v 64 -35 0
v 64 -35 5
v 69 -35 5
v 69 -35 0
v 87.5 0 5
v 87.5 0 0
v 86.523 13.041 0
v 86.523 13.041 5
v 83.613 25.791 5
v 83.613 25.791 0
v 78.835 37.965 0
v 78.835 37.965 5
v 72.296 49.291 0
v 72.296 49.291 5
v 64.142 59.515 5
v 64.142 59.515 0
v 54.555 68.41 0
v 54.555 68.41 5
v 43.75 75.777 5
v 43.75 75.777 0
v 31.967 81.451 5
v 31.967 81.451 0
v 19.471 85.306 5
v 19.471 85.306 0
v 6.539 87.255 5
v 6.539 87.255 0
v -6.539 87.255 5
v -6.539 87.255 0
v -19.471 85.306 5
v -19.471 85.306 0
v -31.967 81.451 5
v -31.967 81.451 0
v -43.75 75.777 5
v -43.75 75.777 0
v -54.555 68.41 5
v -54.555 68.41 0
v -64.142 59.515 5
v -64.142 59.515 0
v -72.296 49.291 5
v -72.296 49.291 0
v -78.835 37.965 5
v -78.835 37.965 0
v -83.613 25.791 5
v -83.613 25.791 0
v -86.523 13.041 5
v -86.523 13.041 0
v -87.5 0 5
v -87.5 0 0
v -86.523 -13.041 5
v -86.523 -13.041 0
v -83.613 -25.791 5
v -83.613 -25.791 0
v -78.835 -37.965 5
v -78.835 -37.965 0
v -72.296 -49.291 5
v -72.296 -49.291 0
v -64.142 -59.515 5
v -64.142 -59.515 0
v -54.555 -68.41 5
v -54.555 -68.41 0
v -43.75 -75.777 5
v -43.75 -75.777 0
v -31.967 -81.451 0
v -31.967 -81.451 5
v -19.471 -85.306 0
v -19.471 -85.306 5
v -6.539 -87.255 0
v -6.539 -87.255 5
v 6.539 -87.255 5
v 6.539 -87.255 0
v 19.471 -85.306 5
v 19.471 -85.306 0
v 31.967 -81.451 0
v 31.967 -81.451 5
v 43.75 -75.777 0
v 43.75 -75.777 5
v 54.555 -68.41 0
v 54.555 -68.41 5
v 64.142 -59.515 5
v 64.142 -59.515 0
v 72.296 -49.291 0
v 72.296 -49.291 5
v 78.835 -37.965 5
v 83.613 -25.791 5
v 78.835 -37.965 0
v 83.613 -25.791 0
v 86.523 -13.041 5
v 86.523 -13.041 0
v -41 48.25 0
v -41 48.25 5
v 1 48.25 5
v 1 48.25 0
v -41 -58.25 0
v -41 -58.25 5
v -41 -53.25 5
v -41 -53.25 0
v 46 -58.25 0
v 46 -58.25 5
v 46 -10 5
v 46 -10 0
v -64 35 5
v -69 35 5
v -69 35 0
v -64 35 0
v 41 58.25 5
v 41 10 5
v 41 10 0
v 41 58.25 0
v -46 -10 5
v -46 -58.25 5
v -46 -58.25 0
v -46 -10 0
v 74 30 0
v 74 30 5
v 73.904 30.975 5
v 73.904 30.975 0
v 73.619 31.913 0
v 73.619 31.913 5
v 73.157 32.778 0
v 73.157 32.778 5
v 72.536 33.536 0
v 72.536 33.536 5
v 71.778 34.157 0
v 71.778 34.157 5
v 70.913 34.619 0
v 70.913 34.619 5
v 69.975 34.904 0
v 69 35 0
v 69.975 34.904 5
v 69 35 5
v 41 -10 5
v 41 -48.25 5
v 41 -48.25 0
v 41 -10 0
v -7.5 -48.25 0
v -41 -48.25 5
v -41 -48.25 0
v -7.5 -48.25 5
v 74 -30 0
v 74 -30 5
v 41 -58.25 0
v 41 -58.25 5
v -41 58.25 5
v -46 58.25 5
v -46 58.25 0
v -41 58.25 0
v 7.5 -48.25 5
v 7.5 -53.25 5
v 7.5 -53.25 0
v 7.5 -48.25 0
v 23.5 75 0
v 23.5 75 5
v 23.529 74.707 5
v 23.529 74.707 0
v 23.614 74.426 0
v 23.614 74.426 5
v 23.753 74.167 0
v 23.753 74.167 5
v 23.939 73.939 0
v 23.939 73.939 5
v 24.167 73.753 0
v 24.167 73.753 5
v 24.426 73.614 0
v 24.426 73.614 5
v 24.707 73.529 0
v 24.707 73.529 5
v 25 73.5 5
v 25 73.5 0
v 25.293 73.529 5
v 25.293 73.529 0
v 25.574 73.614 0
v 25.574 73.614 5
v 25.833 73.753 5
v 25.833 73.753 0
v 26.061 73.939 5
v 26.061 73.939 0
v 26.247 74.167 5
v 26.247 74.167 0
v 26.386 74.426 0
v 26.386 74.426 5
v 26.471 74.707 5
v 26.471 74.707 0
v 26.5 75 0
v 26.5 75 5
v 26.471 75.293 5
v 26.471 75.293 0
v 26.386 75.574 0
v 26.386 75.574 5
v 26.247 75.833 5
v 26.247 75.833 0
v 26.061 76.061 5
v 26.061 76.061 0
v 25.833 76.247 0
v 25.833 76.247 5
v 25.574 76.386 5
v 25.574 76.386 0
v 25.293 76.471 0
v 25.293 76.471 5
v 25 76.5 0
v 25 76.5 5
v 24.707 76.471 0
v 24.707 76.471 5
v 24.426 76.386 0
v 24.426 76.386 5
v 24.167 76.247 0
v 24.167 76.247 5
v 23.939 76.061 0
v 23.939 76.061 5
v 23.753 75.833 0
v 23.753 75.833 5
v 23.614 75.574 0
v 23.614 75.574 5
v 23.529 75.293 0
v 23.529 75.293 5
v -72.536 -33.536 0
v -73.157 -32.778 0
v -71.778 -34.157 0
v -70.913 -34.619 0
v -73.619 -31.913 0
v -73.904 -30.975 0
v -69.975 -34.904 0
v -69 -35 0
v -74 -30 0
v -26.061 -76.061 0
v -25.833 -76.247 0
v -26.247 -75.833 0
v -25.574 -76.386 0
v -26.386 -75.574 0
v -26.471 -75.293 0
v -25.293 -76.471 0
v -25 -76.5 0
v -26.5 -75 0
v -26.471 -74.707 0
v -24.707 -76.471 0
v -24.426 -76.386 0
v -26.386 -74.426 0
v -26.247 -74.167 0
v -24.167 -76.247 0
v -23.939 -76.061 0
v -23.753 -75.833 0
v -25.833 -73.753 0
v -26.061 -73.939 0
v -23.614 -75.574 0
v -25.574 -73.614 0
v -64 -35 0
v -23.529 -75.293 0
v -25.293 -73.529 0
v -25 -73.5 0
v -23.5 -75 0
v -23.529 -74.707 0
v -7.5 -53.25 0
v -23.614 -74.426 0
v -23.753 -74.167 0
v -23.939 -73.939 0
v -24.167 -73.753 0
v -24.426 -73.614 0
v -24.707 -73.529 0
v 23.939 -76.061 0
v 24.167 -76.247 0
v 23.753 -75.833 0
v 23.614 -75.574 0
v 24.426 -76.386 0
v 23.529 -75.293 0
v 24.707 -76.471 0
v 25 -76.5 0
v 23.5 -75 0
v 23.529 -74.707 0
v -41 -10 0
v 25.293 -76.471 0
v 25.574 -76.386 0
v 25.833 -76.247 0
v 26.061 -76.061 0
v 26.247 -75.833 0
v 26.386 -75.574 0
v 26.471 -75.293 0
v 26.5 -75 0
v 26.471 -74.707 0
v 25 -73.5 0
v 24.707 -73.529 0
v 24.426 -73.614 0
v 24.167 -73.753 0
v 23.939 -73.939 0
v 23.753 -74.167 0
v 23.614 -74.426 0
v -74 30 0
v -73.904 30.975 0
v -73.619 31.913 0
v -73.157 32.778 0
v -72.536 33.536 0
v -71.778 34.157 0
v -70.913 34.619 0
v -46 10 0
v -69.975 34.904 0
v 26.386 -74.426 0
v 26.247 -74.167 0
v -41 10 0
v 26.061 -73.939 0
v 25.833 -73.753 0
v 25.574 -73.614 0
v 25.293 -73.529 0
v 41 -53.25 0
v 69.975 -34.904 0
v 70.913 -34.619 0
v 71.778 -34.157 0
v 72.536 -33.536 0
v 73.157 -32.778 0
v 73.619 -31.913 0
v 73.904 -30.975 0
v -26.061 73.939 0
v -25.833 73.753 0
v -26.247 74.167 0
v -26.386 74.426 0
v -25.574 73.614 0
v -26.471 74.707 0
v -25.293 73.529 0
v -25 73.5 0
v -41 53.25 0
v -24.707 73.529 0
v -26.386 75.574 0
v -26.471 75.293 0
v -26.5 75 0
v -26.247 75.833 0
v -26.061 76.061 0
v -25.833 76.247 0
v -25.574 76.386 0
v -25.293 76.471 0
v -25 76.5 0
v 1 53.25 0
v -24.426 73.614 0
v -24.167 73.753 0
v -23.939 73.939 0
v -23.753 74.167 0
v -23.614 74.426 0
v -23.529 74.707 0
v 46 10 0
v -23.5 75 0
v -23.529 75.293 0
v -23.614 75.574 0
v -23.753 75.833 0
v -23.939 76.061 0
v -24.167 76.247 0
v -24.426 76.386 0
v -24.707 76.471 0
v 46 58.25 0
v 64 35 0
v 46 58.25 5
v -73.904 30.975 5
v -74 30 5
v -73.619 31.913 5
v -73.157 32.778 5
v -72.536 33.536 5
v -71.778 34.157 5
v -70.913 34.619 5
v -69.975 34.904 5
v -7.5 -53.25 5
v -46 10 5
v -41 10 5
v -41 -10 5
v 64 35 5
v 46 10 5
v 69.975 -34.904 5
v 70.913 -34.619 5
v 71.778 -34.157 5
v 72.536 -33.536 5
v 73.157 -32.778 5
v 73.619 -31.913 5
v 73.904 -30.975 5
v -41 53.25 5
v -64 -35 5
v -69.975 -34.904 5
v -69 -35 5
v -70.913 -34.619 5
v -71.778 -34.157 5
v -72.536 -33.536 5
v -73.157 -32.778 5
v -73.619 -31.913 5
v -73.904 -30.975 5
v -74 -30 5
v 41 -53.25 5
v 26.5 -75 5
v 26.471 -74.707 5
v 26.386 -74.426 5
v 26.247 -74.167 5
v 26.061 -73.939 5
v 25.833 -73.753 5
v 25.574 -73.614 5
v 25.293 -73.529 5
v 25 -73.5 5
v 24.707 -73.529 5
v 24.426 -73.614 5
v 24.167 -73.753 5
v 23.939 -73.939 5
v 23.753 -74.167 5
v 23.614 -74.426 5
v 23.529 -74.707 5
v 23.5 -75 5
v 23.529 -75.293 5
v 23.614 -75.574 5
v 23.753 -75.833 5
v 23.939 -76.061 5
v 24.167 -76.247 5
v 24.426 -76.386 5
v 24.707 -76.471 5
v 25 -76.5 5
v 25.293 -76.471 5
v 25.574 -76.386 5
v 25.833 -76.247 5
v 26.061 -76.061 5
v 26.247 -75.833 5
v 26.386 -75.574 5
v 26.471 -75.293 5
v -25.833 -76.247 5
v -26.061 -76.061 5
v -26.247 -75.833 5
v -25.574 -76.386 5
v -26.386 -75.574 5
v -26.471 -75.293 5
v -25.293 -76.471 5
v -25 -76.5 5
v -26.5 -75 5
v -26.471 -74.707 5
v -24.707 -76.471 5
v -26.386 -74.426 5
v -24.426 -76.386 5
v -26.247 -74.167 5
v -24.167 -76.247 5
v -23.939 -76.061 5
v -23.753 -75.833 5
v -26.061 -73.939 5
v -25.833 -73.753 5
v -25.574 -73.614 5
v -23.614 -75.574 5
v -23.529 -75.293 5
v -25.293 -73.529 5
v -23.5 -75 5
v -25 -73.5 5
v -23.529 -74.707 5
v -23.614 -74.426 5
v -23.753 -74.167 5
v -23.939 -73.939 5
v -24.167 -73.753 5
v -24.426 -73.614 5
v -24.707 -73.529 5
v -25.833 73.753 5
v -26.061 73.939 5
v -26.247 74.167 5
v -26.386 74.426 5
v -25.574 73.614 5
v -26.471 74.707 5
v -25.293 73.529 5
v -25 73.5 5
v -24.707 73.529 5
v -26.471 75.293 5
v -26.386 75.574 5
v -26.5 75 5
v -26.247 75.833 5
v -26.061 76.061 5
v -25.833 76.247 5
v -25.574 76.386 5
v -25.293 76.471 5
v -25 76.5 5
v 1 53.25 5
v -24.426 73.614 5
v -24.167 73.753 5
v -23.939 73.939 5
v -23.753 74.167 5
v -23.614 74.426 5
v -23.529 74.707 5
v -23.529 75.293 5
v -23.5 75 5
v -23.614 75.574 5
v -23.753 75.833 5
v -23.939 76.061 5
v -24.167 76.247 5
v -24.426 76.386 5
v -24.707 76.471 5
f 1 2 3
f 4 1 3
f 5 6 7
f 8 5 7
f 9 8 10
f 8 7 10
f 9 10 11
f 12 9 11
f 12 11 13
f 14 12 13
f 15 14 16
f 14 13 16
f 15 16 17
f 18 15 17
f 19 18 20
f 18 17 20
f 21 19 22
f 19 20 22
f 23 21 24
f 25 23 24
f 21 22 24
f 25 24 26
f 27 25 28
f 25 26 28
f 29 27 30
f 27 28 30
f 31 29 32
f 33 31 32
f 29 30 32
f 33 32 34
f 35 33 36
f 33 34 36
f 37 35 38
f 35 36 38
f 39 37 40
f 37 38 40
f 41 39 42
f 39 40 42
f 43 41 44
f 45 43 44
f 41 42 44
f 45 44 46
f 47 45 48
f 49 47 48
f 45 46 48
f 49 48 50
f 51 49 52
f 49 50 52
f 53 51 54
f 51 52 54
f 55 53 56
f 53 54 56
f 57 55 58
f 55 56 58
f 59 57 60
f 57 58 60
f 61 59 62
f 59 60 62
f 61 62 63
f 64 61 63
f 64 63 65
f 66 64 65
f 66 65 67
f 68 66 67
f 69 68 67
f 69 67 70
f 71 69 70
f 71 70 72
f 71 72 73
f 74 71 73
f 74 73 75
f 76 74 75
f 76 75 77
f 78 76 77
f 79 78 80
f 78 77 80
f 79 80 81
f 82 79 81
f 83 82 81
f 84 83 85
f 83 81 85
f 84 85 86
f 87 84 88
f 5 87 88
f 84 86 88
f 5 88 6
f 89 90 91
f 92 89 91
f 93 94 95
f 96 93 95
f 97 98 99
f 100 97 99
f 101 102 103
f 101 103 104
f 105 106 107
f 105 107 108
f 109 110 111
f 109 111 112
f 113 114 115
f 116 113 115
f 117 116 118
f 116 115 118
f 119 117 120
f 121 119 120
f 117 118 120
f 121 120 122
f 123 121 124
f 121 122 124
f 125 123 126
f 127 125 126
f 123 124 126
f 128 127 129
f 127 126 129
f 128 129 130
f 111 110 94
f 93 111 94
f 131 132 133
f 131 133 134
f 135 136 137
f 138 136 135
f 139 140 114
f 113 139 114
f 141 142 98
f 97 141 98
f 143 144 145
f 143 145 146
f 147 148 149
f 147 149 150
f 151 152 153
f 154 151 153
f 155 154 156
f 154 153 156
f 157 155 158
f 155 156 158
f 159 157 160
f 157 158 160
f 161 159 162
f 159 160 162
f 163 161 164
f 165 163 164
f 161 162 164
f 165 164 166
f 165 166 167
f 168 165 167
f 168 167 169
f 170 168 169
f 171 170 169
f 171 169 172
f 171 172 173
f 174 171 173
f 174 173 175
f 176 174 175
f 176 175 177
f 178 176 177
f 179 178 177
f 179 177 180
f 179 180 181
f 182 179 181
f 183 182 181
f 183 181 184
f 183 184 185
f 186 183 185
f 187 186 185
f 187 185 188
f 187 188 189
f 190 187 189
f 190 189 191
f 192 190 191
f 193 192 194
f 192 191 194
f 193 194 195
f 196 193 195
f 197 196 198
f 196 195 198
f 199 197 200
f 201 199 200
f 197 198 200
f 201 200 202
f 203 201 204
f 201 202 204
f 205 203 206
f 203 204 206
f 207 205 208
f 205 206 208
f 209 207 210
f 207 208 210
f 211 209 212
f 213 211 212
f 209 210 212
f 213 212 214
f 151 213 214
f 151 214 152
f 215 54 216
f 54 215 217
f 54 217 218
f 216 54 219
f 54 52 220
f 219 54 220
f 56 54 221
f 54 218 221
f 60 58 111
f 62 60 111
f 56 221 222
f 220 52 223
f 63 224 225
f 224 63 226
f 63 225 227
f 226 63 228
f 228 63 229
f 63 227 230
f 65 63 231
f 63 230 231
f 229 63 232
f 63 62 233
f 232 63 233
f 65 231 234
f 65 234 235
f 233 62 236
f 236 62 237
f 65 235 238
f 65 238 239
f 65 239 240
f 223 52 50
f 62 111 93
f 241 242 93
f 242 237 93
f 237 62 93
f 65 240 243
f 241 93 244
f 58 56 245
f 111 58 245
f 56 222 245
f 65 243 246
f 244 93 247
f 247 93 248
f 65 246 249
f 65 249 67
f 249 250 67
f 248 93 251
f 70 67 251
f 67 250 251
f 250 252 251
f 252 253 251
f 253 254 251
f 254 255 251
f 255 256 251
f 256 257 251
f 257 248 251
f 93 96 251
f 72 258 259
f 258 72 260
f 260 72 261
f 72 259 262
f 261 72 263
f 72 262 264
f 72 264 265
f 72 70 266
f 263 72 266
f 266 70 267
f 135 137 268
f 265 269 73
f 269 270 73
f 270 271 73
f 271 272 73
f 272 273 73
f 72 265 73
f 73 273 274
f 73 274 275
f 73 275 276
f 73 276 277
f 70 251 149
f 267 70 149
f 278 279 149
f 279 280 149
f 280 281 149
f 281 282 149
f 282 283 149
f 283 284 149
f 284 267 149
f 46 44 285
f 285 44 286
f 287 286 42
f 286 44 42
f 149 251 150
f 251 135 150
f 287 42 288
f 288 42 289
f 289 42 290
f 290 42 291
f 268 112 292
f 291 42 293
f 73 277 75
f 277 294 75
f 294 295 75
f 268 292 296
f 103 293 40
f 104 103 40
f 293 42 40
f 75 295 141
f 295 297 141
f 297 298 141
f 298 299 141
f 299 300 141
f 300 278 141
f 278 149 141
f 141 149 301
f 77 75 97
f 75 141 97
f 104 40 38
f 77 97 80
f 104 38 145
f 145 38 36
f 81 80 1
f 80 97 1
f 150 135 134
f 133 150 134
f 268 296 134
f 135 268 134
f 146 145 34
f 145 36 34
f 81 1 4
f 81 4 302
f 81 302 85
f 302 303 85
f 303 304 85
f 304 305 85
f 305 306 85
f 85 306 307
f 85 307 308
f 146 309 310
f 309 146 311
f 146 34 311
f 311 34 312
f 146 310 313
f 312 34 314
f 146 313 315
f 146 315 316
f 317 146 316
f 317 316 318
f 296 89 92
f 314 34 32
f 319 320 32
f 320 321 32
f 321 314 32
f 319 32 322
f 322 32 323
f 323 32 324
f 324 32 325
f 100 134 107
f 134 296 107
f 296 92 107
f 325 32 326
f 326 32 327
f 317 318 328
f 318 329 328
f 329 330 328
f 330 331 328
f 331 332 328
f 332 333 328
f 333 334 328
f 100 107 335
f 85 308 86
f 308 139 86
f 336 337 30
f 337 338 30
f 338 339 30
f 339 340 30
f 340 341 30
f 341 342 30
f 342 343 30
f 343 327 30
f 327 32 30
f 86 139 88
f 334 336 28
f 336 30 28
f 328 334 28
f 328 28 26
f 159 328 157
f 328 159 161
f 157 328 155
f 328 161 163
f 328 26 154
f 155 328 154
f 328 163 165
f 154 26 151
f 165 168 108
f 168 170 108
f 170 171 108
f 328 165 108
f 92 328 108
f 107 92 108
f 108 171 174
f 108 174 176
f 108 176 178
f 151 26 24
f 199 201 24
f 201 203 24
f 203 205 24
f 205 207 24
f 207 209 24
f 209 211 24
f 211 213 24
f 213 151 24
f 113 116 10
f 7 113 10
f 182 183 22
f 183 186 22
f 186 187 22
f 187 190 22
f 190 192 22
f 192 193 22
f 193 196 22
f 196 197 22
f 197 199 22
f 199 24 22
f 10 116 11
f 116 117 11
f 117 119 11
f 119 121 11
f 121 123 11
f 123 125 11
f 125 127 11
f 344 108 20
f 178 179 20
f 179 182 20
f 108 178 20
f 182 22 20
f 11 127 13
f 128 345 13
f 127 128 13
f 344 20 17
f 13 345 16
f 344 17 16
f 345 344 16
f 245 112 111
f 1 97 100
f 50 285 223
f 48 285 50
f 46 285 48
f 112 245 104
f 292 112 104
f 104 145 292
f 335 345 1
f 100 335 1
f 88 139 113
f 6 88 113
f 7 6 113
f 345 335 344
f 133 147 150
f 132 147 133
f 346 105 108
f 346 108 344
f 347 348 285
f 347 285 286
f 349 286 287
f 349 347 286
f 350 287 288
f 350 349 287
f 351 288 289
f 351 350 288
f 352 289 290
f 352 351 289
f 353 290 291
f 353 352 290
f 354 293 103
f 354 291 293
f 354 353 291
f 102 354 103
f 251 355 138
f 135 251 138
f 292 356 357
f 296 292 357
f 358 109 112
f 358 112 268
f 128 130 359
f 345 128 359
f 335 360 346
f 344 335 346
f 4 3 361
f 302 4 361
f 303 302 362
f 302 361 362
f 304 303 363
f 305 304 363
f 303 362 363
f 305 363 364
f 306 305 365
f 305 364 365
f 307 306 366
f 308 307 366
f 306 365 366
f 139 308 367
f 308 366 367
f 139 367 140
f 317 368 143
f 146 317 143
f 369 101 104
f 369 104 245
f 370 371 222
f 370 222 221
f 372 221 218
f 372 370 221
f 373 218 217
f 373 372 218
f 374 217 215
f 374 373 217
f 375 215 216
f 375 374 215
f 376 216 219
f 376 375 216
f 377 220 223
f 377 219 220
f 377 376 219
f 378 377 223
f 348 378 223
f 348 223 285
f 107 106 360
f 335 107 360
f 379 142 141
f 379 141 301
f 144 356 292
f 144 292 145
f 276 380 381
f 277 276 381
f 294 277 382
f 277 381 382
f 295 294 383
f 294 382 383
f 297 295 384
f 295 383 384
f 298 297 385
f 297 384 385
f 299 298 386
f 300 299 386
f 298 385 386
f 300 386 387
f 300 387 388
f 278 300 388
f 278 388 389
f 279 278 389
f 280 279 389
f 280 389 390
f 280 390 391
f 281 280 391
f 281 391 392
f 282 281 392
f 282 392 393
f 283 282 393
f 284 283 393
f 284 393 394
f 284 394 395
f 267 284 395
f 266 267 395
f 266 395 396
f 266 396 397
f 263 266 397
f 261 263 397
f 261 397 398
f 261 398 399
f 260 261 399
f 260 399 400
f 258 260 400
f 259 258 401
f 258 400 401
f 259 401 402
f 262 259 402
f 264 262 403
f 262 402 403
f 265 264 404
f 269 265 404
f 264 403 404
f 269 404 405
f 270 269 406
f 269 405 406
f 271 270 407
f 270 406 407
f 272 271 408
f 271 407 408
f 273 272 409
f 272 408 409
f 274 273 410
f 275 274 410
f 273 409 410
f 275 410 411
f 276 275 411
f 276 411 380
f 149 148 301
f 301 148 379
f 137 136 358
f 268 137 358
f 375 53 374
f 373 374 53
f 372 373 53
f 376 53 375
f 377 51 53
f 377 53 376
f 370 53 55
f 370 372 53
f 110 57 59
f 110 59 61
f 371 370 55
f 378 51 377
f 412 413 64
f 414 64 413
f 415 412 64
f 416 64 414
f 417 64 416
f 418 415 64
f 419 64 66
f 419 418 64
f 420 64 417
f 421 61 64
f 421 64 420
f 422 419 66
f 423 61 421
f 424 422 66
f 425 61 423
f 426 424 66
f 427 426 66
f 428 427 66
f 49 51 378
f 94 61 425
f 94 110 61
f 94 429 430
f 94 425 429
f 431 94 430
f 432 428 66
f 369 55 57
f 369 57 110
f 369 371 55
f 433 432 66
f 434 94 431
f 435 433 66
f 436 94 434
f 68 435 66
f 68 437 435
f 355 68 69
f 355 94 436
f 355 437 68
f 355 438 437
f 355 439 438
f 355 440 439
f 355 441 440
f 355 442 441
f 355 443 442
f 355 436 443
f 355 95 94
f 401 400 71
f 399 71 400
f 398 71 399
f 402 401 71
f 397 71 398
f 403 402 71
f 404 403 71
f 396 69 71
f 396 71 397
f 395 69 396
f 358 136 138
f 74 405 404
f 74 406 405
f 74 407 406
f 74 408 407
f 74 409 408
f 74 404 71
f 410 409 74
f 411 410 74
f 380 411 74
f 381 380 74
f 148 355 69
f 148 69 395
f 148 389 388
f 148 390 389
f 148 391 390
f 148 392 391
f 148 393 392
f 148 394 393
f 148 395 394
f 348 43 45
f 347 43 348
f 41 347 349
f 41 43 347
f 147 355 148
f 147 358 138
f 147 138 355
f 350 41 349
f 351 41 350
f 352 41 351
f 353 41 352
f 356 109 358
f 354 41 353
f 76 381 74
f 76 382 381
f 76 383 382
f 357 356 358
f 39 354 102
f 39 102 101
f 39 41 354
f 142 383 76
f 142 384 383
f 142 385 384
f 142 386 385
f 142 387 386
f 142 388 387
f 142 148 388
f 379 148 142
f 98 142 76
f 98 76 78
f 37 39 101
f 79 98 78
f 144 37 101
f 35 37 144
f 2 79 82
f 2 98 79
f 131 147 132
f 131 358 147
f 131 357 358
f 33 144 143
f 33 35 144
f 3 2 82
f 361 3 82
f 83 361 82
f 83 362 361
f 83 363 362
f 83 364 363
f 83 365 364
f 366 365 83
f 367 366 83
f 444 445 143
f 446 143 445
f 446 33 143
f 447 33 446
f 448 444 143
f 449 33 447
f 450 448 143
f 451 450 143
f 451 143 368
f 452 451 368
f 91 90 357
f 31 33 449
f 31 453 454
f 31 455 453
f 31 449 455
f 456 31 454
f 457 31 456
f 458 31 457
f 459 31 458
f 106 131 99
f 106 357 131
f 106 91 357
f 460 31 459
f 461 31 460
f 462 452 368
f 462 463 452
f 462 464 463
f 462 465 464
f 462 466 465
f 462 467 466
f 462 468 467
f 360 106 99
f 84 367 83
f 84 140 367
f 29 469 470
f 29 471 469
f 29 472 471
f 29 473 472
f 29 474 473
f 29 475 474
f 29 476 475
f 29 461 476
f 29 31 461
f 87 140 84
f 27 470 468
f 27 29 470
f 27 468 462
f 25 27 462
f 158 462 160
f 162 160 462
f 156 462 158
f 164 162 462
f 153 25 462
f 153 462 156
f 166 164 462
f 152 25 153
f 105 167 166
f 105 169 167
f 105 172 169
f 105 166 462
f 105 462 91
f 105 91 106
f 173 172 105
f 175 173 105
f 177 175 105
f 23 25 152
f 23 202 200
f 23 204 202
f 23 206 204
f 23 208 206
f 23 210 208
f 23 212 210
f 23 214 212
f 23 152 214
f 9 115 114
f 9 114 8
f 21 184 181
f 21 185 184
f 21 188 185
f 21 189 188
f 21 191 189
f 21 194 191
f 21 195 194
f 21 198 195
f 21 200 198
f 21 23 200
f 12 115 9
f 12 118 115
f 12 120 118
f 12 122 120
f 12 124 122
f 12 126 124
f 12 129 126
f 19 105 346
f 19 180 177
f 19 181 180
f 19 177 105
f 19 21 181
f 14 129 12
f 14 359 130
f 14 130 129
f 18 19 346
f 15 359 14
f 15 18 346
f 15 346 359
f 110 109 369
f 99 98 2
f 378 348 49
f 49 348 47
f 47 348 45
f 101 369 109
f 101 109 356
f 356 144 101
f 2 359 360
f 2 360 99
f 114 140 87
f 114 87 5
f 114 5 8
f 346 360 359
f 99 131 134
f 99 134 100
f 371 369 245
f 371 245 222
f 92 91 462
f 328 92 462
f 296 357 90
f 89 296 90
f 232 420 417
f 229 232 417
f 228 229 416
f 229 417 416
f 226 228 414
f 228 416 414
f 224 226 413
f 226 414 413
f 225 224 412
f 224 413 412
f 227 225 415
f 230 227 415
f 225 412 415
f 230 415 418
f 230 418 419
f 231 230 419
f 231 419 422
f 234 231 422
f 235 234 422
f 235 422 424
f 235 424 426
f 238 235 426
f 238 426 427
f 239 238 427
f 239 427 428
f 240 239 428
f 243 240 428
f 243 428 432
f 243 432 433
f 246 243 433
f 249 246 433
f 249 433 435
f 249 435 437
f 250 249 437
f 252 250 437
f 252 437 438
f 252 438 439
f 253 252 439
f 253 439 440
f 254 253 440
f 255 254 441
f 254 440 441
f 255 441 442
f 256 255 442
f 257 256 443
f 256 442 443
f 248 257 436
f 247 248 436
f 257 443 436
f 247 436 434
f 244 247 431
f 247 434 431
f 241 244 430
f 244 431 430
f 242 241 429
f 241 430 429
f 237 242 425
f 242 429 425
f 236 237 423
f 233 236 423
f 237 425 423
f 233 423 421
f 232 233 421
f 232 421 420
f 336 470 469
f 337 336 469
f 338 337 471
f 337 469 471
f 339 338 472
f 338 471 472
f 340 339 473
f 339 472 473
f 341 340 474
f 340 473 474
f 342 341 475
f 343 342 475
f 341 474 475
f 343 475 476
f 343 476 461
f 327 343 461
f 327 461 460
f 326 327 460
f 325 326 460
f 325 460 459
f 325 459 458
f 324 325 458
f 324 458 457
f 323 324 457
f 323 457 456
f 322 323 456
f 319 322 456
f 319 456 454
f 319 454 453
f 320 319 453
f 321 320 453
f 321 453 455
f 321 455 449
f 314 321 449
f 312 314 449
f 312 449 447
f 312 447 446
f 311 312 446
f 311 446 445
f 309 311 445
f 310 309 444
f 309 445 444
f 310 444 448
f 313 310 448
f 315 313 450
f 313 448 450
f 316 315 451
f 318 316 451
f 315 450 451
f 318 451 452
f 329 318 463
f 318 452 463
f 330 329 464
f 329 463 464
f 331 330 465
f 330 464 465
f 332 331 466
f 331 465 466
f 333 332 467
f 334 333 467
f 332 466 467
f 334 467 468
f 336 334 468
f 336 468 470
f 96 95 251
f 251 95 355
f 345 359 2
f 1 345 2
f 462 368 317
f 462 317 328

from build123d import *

# Parameters (mm, degrees)
SKETCH_1_R          = 87.5
EXTRUDE_1_DEPTH     = 5
CUT_EXTRUDE_1_DEPTH = 124.844660765
SKETCH_2_R          = 1.5
CUT_EXTRUDE_2_DEPTH = 124.844660765
SKETCH_4_W          = 5
SKETCH_4_H          = 48.25
CUT_EXTRUDE_4_DEPTH = 124.844660765
SKETCH_5_W          = 42
SKETCH_5_H          = 5
SKETCH_5_W_2        = 33.5
CUT_EXTRUDE_7_DEPTH = 124.844660765


with BuildPart() as part:
    # 草圖1 → 填料-伸長1 (new body)
    with BuildSketch(Plane.XY):
        Circle(SKETCH_1_R)
    extrude(amount=EXTRUDE_1_DEPTH)

    # 草圖3 → 除料-伸長1 (cut, through all)
    with BuildSketch(Plane.XY.offset(5)):
        with BuildLine():
            ThreePointArc((-69, -35), (-72.535533906, -33.535533906), (-74, -30))
            Line((-74, -30), (-74, 30))
            ThreePointArc((-74, 30), (-72.535533906, 33.535533906), (-69, 35))
            Line((-69, 35), (-64, 35))
            Line((-64, 35), (-64, -35))
            Line((-64, -35), (-69, -35))
        make_face()
        with BuildLine():
            Line((64, 35), (64, -35))
            Line((64, -35), (69, -35))
            ThreePointArc((69, -35), (72.535533906, -33.535533906), (74, -30))
            Line((74, -30), (74, 30))
            ThreePointArc((74, 30), (72.535533906, 33.535533906), (69, 35))
            Line((69, 35), (64, 35))
        make_face()
    extrude(amount=-CUT_EXTRUDE_1_DEPTH, mode=Mode.SUBTRACT)

    # 草圖2 → 除料-伸長2 (cut, through all)
    with BuildSketch(Plane.XY.offset(5)):
        with Locations((-25, 75)):
            Circle(SKETCH_2_R)
        with Locations(Location((-25, -75, 0), (0, 0, 180))):
            Circle(SKETCH_2_R)
        with Locations(Location((25, 75, 0), (0, 0, 180))):
            Circle(SKETCH_2_R)
        with Locations((25, -75)):
            Circle(SKETCH_2_R)
    extrude(amount=-CUT_EXTRUDE_2_DEPTH, mode=Mode.SUBTRACT)

    # 草圖4 → 除料-伸長4 (cut, through all)
    with BuildSketch(Plane.XY.offset(5)):
        with Locations((43.5, -34.125)):
            Rectangle(SKETCH_4_W, SKETCH_4_H)
        with Locations((43.5, 34.125)):
            Rectangle(SKETCH_4_W, SKETCH_4_H)
        with Locations((-43.5, 34.125)):
            Rectangle(SKETCH_4_W, SKETCH_4_H)
        with Locations((-43.5, -34.125)):
            Rectangle(SKETCH_4_W, SKETCH_4_H)
    extrude(amount=-CUT_EXTRUDE_4_DEPTH, mode=Mode.SUBTRACT)

    # 草圖5 → 除料-伸長7 (cut, through all)
    with BuildSketch(Plane.XY.offset(5)):
        with Locations((-20, 50.75)):
            Rectangle(SKETCH_5_W, SKETCH_5_H)
        with Locations((-24.25, -50.75)):
            Rectangle(SKETCH_5_W_2, SKETCH_5_H)
        with Locations((24.25, -50.75)):
            Rectangle(SKETCH_5_W_2, SKETCH_5_H)
    extrude(amount=-CUT_EXTRUDE_7_DEPTH, mode=Mode.SUBTRACT)


solid = part.part
